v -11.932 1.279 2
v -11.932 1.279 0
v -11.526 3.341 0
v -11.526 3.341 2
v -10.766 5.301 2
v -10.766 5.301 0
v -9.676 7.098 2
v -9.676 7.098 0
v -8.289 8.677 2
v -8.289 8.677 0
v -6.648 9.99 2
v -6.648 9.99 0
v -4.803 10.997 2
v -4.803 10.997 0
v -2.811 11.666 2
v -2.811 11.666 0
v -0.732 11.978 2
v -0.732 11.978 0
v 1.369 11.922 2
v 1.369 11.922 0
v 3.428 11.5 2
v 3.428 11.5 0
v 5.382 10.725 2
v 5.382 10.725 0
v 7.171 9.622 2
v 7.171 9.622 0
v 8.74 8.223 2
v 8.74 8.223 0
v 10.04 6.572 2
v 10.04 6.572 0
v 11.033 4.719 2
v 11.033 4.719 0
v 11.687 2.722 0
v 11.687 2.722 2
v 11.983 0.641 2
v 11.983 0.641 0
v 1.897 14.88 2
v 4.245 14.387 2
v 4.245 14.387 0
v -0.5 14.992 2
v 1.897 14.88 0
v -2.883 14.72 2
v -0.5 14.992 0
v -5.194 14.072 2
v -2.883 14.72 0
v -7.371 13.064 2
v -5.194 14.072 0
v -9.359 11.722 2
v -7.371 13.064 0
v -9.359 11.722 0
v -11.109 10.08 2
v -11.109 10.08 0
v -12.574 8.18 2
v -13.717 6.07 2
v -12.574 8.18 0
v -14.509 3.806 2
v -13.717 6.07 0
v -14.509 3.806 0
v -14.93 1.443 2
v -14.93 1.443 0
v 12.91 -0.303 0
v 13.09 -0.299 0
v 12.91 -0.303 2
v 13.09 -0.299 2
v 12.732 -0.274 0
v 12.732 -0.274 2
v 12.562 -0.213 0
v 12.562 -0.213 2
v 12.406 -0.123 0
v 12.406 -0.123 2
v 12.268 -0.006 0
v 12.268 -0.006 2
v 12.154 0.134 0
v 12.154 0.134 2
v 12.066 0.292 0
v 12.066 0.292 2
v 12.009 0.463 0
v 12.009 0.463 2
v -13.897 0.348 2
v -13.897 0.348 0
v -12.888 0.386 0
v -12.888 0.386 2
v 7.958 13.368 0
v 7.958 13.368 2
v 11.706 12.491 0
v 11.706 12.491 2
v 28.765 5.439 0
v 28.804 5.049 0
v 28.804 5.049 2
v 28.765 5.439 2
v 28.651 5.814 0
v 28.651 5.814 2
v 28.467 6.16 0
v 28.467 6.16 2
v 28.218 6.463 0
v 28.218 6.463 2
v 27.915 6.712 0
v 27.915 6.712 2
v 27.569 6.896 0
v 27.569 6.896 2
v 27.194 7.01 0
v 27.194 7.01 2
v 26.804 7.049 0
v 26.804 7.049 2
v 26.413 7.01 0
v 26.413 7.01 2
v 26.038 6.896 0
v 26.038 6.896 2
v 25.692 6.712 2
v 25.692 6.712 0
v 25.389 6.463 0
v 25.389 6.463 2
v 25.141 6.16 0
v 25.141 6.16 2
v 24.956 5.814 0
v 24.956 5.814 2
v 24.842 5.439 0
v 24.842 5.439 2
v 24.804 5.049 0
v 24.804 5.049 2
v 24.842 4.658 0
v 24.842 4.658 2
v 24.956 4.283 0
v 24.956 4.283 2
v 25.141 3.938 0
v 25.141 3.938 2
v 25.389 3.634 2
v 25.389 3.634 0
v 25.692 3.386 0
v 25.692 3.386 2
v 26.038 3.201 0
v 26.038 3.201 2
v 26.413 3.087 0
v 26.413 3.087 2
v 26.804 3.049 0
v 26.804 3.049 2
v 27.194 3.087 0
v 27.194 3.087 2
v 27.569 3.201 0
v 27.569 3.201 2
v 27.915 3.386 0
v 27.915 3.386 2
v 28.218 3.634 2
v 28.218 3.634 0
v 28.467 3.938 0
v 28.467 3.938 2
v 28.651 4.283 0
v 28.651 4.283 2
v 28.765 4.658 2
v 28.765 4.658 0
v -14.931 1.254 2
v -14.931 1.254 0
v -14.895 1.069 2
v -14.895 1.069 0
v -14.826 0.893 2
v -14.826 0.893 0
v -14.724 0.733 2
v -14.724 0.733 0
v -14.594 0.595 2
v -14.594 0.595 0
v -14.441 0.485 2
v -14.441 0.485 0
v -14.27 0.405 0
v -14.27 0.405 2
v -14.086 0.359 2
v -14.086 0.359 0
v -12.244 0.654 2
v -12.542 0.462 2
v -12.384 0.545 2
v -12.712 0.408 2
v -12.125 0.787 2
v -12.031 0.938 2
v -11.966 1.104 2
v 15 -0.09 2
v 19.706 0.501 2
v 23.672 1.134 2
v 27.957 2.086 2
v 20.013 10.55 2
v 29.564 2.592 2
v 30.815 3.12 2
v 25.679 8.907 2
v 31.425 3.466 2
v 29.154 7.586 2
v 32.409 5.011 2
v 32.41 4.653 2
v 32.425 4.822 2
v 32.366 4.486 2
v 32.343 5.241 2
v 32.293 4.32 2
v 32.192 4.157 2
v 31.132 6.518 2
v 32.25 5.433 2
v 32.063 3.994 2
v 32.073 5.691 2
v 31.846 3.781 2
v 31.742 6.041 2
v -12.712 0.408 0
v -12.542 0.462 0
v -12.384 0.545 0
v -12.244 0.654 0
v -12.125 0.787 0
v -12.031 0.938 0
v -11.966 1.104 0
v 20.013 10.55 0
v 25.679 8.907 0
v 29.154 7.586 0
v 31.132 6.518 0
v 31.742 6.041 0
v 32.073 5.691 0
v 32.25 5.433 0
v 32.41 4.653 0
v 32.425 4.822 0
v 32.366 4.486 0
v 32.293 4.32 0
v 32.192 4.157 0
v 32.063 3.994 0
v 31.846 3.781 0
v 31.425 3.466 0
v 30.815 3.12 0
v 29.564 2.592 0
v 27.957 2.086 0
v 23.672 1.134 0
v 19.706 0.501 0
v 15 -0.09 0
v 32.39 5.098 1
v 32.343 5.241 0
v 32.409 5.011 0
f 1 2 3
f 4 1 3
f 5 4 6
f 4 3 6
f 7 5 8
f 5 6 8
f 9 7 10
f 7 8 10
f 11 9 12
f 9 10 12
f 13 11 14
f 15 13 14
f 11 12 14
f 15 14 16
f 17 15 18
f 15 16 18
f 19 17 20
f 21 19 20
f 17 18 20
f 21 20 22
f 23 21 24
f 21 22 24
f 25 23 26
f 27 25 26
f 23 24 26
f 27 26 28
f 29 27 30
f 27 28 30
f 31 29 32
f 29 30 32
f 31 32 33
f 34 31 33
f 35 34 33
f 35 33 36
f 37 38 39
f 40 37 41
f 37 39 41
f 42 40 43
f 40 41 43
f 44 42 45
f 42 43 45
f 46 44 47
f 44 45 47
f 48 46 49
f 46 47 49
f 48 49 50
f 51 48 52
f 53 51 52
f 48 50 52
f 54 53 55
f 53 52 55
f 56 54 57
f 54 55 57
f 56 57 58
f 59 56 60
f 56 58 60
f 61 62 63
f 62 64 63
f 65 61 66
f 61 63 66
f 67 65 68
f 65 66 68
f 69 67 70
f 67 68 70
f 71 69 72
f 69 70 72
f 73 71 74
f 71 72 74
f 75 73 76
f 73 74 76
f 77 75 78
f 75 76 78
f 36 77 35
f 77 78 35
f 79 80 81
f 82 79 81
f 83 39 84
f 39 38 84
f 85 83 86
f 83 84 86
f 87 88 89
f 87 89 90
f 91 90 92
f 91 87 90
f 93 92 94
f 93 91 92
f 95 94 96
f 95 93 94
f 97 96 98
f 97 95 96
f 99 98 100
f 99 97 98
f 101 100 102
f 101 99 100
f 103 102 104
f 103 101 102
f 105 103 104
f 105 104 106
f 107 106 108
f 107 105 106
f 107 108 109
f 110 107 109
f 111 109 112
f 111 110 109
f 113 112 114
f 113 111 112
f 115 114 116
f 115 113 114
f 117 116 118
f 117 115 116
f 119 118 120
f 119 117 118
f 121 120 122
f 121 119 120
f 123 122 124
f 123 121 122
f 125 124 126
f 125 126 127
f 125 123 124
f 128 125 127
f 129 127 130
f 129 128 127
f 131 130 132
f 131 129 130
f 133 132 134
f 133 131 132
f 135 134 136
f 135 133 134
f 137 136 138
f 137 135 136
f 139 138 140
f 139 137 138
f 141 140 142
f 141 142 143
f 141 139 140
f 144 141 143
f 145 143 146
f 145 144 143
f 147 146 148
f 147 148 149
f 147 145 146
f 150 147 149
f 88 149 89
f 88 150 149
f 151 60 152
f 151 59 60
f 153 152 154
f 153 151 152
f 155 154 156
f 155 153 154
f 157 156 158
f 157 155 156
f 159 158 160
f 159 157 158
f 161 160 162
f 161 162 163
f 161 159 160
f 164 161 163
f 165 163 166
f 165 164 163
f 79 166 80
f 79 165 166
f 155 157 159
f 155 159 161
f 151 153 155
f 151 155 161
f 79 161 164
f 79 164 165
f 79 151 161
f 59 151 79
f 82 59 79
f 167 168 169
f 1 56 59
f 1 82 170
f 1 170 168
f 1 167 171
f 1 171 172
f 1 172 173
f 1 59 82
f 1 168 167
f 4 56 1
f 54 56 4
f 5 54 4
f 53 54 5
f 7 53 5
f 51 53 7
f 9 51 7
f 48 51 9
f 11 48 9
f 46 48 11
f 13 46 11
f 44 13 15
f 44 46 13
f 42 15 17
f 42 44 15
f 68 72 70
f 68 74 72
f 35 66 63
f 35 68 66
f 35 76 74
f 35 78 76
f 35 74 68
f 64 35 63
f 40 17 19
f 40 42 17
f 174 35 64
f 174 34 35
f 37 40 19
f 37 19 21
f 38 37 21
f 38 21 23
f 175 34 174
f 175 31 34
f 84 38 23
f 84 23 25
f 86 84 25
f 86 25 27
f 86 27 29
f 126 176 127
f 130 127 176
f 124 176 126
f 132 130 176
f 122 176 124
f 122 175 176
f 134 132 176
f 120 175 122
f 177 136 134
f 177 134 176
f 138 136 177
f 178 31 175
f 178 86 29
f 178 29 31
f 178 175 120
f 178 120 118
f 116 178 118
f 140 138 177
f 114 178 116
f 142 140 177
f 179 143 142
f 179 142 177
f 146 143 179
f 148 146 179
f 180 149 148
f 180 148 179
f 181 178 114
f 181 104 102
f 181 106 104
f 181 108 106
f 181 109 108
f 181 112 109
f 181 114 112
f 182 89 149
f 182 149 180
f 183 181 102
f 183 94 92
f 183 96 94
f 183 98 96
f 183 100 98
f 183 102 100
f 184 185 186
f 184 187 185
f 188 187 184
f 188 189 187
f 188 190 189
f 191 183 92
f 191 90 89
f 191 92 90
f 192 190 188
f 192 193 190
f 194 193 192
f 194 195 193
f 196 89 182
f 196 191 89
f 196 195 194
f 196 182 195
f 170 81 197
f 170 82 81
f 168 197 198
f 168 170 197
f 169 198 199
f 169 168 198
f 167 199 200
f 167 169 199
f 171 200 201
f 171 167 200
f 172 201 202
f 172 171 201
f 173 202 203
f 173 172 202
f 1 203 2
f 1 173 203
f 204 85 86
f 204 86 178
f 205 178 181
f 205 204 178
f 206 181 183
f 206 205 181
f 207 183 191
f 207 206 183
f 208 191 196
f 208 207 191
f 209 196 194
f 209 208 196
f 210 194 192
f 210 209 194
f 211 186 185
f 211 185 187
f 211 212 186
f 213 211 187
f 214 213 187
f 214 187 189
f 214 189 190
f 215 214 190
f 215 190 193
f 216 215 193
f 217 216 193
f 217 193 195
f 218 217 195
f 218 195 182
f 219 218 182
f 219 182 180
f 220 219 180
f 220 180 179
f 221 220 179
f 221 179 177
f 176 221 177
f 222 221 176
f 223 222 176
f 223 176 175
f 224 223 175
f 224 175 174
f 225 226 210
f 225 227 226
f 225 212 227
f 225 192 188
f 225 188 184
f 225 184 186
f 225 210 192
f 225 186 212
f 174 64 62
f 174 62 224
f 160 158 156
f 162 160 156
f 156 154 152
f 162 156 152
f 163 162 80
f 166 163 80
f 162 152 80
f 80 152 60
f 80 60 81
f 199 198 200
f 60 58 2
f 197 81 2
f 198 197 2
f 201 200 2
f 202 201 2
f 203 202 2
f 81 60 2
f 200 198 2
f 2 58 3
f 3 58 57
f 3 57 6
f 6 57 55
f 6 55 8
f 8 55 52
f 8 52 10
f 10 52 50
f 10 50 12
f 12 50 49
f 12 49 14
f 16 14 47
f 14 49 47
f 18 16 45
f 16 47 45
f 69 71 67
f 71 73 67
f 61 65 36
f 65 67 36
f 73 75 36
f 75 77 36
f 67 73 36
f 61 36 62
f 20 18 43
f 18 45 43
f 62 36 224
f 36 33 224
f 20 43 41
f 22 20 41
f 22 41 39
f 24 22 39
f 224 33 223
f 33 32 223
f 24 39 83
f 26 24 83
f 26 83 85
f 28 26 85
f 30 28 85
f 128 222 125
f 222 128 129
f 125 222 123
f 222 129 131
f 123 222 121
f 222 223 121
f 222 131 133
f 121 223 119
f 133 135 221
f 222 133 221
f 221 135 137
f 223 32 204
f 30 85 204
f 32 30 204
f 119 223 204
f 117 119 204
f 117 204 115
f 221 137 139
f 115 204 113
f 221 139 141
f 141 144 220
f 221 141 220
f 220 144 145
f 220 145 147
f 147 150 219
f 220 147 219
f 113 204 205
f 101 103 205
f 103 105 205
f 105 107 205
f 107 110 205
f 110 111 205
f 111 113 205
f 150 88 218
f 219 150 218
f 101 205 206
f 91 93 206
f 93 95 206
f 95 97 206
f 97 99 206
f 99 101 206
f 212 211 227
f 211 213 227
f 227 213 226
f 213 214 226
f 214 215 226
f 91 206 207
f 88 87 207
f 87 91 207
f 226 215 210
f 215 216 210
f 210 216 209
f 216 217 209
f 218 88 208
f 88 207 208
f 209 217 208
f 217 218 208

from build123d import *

# Parameters (mm, degrees)
ESQUISSE1_R        = 2
BOSS_EXTRU_1_DEPTH = 2
CONG_1_R           = 1
CONG_2_R           = 101


with BuildPart() as part:
    # Esquisse1 → Boss.-Extru.1 (new body)
    with BuildSketch(Plane.XY):
        with BuildLine():
            ThreePointArc((6.353742359, 13.587860686), (-7.923021794, 12.736786316), (-14.996867452, 0.306539744))
            Line((-14.996867452, 0.306539744), (-11.992657898, 0.419710068))
            ThreePointArc((-11.992657898, 0.419710068), (0.419710068, 11.992657898), (11.992657898, -0.419710068))
            Line((11.992657898, -0.419710068), (14.999728999, -0.090166274))
            add(Edge.make_bspline(
                [(6.353742359, 13.587860686), (53.739631024, 4.255841601), (14.999728999, -0.090166274)],
                knots=[0, 0, 0, 1, 1, 1], degree=2))
        make_face()
        with Locations((26.803607687, 5.048670414)):
            Circle(ESQUISSE1_R, mode=Mode.SUBTRACT)
    extrude(amount=BOSS_EXTRU_1_DEPTH)

    # Congé1
    cong_1_edges = [part.edges().sort_by_distance(p)[0] for p in [
        (11.992657898, -0.419710068, 1),
        (-11.992657898, 0.419710068, 1),
        (-14.996867452, 0.306539744, 1),
    ]]
    fillet(cong_1_edges, radius=CONG_1_R)

    # Congé2
    cong_2_edges = [part.edges().sort_by_distance(p)[0] for p in [
        (6.353742359, 13.587860686, 1),
    ]]
    fillet(cong_2_edges, radius=CONG_2_R)


solid = part.part
